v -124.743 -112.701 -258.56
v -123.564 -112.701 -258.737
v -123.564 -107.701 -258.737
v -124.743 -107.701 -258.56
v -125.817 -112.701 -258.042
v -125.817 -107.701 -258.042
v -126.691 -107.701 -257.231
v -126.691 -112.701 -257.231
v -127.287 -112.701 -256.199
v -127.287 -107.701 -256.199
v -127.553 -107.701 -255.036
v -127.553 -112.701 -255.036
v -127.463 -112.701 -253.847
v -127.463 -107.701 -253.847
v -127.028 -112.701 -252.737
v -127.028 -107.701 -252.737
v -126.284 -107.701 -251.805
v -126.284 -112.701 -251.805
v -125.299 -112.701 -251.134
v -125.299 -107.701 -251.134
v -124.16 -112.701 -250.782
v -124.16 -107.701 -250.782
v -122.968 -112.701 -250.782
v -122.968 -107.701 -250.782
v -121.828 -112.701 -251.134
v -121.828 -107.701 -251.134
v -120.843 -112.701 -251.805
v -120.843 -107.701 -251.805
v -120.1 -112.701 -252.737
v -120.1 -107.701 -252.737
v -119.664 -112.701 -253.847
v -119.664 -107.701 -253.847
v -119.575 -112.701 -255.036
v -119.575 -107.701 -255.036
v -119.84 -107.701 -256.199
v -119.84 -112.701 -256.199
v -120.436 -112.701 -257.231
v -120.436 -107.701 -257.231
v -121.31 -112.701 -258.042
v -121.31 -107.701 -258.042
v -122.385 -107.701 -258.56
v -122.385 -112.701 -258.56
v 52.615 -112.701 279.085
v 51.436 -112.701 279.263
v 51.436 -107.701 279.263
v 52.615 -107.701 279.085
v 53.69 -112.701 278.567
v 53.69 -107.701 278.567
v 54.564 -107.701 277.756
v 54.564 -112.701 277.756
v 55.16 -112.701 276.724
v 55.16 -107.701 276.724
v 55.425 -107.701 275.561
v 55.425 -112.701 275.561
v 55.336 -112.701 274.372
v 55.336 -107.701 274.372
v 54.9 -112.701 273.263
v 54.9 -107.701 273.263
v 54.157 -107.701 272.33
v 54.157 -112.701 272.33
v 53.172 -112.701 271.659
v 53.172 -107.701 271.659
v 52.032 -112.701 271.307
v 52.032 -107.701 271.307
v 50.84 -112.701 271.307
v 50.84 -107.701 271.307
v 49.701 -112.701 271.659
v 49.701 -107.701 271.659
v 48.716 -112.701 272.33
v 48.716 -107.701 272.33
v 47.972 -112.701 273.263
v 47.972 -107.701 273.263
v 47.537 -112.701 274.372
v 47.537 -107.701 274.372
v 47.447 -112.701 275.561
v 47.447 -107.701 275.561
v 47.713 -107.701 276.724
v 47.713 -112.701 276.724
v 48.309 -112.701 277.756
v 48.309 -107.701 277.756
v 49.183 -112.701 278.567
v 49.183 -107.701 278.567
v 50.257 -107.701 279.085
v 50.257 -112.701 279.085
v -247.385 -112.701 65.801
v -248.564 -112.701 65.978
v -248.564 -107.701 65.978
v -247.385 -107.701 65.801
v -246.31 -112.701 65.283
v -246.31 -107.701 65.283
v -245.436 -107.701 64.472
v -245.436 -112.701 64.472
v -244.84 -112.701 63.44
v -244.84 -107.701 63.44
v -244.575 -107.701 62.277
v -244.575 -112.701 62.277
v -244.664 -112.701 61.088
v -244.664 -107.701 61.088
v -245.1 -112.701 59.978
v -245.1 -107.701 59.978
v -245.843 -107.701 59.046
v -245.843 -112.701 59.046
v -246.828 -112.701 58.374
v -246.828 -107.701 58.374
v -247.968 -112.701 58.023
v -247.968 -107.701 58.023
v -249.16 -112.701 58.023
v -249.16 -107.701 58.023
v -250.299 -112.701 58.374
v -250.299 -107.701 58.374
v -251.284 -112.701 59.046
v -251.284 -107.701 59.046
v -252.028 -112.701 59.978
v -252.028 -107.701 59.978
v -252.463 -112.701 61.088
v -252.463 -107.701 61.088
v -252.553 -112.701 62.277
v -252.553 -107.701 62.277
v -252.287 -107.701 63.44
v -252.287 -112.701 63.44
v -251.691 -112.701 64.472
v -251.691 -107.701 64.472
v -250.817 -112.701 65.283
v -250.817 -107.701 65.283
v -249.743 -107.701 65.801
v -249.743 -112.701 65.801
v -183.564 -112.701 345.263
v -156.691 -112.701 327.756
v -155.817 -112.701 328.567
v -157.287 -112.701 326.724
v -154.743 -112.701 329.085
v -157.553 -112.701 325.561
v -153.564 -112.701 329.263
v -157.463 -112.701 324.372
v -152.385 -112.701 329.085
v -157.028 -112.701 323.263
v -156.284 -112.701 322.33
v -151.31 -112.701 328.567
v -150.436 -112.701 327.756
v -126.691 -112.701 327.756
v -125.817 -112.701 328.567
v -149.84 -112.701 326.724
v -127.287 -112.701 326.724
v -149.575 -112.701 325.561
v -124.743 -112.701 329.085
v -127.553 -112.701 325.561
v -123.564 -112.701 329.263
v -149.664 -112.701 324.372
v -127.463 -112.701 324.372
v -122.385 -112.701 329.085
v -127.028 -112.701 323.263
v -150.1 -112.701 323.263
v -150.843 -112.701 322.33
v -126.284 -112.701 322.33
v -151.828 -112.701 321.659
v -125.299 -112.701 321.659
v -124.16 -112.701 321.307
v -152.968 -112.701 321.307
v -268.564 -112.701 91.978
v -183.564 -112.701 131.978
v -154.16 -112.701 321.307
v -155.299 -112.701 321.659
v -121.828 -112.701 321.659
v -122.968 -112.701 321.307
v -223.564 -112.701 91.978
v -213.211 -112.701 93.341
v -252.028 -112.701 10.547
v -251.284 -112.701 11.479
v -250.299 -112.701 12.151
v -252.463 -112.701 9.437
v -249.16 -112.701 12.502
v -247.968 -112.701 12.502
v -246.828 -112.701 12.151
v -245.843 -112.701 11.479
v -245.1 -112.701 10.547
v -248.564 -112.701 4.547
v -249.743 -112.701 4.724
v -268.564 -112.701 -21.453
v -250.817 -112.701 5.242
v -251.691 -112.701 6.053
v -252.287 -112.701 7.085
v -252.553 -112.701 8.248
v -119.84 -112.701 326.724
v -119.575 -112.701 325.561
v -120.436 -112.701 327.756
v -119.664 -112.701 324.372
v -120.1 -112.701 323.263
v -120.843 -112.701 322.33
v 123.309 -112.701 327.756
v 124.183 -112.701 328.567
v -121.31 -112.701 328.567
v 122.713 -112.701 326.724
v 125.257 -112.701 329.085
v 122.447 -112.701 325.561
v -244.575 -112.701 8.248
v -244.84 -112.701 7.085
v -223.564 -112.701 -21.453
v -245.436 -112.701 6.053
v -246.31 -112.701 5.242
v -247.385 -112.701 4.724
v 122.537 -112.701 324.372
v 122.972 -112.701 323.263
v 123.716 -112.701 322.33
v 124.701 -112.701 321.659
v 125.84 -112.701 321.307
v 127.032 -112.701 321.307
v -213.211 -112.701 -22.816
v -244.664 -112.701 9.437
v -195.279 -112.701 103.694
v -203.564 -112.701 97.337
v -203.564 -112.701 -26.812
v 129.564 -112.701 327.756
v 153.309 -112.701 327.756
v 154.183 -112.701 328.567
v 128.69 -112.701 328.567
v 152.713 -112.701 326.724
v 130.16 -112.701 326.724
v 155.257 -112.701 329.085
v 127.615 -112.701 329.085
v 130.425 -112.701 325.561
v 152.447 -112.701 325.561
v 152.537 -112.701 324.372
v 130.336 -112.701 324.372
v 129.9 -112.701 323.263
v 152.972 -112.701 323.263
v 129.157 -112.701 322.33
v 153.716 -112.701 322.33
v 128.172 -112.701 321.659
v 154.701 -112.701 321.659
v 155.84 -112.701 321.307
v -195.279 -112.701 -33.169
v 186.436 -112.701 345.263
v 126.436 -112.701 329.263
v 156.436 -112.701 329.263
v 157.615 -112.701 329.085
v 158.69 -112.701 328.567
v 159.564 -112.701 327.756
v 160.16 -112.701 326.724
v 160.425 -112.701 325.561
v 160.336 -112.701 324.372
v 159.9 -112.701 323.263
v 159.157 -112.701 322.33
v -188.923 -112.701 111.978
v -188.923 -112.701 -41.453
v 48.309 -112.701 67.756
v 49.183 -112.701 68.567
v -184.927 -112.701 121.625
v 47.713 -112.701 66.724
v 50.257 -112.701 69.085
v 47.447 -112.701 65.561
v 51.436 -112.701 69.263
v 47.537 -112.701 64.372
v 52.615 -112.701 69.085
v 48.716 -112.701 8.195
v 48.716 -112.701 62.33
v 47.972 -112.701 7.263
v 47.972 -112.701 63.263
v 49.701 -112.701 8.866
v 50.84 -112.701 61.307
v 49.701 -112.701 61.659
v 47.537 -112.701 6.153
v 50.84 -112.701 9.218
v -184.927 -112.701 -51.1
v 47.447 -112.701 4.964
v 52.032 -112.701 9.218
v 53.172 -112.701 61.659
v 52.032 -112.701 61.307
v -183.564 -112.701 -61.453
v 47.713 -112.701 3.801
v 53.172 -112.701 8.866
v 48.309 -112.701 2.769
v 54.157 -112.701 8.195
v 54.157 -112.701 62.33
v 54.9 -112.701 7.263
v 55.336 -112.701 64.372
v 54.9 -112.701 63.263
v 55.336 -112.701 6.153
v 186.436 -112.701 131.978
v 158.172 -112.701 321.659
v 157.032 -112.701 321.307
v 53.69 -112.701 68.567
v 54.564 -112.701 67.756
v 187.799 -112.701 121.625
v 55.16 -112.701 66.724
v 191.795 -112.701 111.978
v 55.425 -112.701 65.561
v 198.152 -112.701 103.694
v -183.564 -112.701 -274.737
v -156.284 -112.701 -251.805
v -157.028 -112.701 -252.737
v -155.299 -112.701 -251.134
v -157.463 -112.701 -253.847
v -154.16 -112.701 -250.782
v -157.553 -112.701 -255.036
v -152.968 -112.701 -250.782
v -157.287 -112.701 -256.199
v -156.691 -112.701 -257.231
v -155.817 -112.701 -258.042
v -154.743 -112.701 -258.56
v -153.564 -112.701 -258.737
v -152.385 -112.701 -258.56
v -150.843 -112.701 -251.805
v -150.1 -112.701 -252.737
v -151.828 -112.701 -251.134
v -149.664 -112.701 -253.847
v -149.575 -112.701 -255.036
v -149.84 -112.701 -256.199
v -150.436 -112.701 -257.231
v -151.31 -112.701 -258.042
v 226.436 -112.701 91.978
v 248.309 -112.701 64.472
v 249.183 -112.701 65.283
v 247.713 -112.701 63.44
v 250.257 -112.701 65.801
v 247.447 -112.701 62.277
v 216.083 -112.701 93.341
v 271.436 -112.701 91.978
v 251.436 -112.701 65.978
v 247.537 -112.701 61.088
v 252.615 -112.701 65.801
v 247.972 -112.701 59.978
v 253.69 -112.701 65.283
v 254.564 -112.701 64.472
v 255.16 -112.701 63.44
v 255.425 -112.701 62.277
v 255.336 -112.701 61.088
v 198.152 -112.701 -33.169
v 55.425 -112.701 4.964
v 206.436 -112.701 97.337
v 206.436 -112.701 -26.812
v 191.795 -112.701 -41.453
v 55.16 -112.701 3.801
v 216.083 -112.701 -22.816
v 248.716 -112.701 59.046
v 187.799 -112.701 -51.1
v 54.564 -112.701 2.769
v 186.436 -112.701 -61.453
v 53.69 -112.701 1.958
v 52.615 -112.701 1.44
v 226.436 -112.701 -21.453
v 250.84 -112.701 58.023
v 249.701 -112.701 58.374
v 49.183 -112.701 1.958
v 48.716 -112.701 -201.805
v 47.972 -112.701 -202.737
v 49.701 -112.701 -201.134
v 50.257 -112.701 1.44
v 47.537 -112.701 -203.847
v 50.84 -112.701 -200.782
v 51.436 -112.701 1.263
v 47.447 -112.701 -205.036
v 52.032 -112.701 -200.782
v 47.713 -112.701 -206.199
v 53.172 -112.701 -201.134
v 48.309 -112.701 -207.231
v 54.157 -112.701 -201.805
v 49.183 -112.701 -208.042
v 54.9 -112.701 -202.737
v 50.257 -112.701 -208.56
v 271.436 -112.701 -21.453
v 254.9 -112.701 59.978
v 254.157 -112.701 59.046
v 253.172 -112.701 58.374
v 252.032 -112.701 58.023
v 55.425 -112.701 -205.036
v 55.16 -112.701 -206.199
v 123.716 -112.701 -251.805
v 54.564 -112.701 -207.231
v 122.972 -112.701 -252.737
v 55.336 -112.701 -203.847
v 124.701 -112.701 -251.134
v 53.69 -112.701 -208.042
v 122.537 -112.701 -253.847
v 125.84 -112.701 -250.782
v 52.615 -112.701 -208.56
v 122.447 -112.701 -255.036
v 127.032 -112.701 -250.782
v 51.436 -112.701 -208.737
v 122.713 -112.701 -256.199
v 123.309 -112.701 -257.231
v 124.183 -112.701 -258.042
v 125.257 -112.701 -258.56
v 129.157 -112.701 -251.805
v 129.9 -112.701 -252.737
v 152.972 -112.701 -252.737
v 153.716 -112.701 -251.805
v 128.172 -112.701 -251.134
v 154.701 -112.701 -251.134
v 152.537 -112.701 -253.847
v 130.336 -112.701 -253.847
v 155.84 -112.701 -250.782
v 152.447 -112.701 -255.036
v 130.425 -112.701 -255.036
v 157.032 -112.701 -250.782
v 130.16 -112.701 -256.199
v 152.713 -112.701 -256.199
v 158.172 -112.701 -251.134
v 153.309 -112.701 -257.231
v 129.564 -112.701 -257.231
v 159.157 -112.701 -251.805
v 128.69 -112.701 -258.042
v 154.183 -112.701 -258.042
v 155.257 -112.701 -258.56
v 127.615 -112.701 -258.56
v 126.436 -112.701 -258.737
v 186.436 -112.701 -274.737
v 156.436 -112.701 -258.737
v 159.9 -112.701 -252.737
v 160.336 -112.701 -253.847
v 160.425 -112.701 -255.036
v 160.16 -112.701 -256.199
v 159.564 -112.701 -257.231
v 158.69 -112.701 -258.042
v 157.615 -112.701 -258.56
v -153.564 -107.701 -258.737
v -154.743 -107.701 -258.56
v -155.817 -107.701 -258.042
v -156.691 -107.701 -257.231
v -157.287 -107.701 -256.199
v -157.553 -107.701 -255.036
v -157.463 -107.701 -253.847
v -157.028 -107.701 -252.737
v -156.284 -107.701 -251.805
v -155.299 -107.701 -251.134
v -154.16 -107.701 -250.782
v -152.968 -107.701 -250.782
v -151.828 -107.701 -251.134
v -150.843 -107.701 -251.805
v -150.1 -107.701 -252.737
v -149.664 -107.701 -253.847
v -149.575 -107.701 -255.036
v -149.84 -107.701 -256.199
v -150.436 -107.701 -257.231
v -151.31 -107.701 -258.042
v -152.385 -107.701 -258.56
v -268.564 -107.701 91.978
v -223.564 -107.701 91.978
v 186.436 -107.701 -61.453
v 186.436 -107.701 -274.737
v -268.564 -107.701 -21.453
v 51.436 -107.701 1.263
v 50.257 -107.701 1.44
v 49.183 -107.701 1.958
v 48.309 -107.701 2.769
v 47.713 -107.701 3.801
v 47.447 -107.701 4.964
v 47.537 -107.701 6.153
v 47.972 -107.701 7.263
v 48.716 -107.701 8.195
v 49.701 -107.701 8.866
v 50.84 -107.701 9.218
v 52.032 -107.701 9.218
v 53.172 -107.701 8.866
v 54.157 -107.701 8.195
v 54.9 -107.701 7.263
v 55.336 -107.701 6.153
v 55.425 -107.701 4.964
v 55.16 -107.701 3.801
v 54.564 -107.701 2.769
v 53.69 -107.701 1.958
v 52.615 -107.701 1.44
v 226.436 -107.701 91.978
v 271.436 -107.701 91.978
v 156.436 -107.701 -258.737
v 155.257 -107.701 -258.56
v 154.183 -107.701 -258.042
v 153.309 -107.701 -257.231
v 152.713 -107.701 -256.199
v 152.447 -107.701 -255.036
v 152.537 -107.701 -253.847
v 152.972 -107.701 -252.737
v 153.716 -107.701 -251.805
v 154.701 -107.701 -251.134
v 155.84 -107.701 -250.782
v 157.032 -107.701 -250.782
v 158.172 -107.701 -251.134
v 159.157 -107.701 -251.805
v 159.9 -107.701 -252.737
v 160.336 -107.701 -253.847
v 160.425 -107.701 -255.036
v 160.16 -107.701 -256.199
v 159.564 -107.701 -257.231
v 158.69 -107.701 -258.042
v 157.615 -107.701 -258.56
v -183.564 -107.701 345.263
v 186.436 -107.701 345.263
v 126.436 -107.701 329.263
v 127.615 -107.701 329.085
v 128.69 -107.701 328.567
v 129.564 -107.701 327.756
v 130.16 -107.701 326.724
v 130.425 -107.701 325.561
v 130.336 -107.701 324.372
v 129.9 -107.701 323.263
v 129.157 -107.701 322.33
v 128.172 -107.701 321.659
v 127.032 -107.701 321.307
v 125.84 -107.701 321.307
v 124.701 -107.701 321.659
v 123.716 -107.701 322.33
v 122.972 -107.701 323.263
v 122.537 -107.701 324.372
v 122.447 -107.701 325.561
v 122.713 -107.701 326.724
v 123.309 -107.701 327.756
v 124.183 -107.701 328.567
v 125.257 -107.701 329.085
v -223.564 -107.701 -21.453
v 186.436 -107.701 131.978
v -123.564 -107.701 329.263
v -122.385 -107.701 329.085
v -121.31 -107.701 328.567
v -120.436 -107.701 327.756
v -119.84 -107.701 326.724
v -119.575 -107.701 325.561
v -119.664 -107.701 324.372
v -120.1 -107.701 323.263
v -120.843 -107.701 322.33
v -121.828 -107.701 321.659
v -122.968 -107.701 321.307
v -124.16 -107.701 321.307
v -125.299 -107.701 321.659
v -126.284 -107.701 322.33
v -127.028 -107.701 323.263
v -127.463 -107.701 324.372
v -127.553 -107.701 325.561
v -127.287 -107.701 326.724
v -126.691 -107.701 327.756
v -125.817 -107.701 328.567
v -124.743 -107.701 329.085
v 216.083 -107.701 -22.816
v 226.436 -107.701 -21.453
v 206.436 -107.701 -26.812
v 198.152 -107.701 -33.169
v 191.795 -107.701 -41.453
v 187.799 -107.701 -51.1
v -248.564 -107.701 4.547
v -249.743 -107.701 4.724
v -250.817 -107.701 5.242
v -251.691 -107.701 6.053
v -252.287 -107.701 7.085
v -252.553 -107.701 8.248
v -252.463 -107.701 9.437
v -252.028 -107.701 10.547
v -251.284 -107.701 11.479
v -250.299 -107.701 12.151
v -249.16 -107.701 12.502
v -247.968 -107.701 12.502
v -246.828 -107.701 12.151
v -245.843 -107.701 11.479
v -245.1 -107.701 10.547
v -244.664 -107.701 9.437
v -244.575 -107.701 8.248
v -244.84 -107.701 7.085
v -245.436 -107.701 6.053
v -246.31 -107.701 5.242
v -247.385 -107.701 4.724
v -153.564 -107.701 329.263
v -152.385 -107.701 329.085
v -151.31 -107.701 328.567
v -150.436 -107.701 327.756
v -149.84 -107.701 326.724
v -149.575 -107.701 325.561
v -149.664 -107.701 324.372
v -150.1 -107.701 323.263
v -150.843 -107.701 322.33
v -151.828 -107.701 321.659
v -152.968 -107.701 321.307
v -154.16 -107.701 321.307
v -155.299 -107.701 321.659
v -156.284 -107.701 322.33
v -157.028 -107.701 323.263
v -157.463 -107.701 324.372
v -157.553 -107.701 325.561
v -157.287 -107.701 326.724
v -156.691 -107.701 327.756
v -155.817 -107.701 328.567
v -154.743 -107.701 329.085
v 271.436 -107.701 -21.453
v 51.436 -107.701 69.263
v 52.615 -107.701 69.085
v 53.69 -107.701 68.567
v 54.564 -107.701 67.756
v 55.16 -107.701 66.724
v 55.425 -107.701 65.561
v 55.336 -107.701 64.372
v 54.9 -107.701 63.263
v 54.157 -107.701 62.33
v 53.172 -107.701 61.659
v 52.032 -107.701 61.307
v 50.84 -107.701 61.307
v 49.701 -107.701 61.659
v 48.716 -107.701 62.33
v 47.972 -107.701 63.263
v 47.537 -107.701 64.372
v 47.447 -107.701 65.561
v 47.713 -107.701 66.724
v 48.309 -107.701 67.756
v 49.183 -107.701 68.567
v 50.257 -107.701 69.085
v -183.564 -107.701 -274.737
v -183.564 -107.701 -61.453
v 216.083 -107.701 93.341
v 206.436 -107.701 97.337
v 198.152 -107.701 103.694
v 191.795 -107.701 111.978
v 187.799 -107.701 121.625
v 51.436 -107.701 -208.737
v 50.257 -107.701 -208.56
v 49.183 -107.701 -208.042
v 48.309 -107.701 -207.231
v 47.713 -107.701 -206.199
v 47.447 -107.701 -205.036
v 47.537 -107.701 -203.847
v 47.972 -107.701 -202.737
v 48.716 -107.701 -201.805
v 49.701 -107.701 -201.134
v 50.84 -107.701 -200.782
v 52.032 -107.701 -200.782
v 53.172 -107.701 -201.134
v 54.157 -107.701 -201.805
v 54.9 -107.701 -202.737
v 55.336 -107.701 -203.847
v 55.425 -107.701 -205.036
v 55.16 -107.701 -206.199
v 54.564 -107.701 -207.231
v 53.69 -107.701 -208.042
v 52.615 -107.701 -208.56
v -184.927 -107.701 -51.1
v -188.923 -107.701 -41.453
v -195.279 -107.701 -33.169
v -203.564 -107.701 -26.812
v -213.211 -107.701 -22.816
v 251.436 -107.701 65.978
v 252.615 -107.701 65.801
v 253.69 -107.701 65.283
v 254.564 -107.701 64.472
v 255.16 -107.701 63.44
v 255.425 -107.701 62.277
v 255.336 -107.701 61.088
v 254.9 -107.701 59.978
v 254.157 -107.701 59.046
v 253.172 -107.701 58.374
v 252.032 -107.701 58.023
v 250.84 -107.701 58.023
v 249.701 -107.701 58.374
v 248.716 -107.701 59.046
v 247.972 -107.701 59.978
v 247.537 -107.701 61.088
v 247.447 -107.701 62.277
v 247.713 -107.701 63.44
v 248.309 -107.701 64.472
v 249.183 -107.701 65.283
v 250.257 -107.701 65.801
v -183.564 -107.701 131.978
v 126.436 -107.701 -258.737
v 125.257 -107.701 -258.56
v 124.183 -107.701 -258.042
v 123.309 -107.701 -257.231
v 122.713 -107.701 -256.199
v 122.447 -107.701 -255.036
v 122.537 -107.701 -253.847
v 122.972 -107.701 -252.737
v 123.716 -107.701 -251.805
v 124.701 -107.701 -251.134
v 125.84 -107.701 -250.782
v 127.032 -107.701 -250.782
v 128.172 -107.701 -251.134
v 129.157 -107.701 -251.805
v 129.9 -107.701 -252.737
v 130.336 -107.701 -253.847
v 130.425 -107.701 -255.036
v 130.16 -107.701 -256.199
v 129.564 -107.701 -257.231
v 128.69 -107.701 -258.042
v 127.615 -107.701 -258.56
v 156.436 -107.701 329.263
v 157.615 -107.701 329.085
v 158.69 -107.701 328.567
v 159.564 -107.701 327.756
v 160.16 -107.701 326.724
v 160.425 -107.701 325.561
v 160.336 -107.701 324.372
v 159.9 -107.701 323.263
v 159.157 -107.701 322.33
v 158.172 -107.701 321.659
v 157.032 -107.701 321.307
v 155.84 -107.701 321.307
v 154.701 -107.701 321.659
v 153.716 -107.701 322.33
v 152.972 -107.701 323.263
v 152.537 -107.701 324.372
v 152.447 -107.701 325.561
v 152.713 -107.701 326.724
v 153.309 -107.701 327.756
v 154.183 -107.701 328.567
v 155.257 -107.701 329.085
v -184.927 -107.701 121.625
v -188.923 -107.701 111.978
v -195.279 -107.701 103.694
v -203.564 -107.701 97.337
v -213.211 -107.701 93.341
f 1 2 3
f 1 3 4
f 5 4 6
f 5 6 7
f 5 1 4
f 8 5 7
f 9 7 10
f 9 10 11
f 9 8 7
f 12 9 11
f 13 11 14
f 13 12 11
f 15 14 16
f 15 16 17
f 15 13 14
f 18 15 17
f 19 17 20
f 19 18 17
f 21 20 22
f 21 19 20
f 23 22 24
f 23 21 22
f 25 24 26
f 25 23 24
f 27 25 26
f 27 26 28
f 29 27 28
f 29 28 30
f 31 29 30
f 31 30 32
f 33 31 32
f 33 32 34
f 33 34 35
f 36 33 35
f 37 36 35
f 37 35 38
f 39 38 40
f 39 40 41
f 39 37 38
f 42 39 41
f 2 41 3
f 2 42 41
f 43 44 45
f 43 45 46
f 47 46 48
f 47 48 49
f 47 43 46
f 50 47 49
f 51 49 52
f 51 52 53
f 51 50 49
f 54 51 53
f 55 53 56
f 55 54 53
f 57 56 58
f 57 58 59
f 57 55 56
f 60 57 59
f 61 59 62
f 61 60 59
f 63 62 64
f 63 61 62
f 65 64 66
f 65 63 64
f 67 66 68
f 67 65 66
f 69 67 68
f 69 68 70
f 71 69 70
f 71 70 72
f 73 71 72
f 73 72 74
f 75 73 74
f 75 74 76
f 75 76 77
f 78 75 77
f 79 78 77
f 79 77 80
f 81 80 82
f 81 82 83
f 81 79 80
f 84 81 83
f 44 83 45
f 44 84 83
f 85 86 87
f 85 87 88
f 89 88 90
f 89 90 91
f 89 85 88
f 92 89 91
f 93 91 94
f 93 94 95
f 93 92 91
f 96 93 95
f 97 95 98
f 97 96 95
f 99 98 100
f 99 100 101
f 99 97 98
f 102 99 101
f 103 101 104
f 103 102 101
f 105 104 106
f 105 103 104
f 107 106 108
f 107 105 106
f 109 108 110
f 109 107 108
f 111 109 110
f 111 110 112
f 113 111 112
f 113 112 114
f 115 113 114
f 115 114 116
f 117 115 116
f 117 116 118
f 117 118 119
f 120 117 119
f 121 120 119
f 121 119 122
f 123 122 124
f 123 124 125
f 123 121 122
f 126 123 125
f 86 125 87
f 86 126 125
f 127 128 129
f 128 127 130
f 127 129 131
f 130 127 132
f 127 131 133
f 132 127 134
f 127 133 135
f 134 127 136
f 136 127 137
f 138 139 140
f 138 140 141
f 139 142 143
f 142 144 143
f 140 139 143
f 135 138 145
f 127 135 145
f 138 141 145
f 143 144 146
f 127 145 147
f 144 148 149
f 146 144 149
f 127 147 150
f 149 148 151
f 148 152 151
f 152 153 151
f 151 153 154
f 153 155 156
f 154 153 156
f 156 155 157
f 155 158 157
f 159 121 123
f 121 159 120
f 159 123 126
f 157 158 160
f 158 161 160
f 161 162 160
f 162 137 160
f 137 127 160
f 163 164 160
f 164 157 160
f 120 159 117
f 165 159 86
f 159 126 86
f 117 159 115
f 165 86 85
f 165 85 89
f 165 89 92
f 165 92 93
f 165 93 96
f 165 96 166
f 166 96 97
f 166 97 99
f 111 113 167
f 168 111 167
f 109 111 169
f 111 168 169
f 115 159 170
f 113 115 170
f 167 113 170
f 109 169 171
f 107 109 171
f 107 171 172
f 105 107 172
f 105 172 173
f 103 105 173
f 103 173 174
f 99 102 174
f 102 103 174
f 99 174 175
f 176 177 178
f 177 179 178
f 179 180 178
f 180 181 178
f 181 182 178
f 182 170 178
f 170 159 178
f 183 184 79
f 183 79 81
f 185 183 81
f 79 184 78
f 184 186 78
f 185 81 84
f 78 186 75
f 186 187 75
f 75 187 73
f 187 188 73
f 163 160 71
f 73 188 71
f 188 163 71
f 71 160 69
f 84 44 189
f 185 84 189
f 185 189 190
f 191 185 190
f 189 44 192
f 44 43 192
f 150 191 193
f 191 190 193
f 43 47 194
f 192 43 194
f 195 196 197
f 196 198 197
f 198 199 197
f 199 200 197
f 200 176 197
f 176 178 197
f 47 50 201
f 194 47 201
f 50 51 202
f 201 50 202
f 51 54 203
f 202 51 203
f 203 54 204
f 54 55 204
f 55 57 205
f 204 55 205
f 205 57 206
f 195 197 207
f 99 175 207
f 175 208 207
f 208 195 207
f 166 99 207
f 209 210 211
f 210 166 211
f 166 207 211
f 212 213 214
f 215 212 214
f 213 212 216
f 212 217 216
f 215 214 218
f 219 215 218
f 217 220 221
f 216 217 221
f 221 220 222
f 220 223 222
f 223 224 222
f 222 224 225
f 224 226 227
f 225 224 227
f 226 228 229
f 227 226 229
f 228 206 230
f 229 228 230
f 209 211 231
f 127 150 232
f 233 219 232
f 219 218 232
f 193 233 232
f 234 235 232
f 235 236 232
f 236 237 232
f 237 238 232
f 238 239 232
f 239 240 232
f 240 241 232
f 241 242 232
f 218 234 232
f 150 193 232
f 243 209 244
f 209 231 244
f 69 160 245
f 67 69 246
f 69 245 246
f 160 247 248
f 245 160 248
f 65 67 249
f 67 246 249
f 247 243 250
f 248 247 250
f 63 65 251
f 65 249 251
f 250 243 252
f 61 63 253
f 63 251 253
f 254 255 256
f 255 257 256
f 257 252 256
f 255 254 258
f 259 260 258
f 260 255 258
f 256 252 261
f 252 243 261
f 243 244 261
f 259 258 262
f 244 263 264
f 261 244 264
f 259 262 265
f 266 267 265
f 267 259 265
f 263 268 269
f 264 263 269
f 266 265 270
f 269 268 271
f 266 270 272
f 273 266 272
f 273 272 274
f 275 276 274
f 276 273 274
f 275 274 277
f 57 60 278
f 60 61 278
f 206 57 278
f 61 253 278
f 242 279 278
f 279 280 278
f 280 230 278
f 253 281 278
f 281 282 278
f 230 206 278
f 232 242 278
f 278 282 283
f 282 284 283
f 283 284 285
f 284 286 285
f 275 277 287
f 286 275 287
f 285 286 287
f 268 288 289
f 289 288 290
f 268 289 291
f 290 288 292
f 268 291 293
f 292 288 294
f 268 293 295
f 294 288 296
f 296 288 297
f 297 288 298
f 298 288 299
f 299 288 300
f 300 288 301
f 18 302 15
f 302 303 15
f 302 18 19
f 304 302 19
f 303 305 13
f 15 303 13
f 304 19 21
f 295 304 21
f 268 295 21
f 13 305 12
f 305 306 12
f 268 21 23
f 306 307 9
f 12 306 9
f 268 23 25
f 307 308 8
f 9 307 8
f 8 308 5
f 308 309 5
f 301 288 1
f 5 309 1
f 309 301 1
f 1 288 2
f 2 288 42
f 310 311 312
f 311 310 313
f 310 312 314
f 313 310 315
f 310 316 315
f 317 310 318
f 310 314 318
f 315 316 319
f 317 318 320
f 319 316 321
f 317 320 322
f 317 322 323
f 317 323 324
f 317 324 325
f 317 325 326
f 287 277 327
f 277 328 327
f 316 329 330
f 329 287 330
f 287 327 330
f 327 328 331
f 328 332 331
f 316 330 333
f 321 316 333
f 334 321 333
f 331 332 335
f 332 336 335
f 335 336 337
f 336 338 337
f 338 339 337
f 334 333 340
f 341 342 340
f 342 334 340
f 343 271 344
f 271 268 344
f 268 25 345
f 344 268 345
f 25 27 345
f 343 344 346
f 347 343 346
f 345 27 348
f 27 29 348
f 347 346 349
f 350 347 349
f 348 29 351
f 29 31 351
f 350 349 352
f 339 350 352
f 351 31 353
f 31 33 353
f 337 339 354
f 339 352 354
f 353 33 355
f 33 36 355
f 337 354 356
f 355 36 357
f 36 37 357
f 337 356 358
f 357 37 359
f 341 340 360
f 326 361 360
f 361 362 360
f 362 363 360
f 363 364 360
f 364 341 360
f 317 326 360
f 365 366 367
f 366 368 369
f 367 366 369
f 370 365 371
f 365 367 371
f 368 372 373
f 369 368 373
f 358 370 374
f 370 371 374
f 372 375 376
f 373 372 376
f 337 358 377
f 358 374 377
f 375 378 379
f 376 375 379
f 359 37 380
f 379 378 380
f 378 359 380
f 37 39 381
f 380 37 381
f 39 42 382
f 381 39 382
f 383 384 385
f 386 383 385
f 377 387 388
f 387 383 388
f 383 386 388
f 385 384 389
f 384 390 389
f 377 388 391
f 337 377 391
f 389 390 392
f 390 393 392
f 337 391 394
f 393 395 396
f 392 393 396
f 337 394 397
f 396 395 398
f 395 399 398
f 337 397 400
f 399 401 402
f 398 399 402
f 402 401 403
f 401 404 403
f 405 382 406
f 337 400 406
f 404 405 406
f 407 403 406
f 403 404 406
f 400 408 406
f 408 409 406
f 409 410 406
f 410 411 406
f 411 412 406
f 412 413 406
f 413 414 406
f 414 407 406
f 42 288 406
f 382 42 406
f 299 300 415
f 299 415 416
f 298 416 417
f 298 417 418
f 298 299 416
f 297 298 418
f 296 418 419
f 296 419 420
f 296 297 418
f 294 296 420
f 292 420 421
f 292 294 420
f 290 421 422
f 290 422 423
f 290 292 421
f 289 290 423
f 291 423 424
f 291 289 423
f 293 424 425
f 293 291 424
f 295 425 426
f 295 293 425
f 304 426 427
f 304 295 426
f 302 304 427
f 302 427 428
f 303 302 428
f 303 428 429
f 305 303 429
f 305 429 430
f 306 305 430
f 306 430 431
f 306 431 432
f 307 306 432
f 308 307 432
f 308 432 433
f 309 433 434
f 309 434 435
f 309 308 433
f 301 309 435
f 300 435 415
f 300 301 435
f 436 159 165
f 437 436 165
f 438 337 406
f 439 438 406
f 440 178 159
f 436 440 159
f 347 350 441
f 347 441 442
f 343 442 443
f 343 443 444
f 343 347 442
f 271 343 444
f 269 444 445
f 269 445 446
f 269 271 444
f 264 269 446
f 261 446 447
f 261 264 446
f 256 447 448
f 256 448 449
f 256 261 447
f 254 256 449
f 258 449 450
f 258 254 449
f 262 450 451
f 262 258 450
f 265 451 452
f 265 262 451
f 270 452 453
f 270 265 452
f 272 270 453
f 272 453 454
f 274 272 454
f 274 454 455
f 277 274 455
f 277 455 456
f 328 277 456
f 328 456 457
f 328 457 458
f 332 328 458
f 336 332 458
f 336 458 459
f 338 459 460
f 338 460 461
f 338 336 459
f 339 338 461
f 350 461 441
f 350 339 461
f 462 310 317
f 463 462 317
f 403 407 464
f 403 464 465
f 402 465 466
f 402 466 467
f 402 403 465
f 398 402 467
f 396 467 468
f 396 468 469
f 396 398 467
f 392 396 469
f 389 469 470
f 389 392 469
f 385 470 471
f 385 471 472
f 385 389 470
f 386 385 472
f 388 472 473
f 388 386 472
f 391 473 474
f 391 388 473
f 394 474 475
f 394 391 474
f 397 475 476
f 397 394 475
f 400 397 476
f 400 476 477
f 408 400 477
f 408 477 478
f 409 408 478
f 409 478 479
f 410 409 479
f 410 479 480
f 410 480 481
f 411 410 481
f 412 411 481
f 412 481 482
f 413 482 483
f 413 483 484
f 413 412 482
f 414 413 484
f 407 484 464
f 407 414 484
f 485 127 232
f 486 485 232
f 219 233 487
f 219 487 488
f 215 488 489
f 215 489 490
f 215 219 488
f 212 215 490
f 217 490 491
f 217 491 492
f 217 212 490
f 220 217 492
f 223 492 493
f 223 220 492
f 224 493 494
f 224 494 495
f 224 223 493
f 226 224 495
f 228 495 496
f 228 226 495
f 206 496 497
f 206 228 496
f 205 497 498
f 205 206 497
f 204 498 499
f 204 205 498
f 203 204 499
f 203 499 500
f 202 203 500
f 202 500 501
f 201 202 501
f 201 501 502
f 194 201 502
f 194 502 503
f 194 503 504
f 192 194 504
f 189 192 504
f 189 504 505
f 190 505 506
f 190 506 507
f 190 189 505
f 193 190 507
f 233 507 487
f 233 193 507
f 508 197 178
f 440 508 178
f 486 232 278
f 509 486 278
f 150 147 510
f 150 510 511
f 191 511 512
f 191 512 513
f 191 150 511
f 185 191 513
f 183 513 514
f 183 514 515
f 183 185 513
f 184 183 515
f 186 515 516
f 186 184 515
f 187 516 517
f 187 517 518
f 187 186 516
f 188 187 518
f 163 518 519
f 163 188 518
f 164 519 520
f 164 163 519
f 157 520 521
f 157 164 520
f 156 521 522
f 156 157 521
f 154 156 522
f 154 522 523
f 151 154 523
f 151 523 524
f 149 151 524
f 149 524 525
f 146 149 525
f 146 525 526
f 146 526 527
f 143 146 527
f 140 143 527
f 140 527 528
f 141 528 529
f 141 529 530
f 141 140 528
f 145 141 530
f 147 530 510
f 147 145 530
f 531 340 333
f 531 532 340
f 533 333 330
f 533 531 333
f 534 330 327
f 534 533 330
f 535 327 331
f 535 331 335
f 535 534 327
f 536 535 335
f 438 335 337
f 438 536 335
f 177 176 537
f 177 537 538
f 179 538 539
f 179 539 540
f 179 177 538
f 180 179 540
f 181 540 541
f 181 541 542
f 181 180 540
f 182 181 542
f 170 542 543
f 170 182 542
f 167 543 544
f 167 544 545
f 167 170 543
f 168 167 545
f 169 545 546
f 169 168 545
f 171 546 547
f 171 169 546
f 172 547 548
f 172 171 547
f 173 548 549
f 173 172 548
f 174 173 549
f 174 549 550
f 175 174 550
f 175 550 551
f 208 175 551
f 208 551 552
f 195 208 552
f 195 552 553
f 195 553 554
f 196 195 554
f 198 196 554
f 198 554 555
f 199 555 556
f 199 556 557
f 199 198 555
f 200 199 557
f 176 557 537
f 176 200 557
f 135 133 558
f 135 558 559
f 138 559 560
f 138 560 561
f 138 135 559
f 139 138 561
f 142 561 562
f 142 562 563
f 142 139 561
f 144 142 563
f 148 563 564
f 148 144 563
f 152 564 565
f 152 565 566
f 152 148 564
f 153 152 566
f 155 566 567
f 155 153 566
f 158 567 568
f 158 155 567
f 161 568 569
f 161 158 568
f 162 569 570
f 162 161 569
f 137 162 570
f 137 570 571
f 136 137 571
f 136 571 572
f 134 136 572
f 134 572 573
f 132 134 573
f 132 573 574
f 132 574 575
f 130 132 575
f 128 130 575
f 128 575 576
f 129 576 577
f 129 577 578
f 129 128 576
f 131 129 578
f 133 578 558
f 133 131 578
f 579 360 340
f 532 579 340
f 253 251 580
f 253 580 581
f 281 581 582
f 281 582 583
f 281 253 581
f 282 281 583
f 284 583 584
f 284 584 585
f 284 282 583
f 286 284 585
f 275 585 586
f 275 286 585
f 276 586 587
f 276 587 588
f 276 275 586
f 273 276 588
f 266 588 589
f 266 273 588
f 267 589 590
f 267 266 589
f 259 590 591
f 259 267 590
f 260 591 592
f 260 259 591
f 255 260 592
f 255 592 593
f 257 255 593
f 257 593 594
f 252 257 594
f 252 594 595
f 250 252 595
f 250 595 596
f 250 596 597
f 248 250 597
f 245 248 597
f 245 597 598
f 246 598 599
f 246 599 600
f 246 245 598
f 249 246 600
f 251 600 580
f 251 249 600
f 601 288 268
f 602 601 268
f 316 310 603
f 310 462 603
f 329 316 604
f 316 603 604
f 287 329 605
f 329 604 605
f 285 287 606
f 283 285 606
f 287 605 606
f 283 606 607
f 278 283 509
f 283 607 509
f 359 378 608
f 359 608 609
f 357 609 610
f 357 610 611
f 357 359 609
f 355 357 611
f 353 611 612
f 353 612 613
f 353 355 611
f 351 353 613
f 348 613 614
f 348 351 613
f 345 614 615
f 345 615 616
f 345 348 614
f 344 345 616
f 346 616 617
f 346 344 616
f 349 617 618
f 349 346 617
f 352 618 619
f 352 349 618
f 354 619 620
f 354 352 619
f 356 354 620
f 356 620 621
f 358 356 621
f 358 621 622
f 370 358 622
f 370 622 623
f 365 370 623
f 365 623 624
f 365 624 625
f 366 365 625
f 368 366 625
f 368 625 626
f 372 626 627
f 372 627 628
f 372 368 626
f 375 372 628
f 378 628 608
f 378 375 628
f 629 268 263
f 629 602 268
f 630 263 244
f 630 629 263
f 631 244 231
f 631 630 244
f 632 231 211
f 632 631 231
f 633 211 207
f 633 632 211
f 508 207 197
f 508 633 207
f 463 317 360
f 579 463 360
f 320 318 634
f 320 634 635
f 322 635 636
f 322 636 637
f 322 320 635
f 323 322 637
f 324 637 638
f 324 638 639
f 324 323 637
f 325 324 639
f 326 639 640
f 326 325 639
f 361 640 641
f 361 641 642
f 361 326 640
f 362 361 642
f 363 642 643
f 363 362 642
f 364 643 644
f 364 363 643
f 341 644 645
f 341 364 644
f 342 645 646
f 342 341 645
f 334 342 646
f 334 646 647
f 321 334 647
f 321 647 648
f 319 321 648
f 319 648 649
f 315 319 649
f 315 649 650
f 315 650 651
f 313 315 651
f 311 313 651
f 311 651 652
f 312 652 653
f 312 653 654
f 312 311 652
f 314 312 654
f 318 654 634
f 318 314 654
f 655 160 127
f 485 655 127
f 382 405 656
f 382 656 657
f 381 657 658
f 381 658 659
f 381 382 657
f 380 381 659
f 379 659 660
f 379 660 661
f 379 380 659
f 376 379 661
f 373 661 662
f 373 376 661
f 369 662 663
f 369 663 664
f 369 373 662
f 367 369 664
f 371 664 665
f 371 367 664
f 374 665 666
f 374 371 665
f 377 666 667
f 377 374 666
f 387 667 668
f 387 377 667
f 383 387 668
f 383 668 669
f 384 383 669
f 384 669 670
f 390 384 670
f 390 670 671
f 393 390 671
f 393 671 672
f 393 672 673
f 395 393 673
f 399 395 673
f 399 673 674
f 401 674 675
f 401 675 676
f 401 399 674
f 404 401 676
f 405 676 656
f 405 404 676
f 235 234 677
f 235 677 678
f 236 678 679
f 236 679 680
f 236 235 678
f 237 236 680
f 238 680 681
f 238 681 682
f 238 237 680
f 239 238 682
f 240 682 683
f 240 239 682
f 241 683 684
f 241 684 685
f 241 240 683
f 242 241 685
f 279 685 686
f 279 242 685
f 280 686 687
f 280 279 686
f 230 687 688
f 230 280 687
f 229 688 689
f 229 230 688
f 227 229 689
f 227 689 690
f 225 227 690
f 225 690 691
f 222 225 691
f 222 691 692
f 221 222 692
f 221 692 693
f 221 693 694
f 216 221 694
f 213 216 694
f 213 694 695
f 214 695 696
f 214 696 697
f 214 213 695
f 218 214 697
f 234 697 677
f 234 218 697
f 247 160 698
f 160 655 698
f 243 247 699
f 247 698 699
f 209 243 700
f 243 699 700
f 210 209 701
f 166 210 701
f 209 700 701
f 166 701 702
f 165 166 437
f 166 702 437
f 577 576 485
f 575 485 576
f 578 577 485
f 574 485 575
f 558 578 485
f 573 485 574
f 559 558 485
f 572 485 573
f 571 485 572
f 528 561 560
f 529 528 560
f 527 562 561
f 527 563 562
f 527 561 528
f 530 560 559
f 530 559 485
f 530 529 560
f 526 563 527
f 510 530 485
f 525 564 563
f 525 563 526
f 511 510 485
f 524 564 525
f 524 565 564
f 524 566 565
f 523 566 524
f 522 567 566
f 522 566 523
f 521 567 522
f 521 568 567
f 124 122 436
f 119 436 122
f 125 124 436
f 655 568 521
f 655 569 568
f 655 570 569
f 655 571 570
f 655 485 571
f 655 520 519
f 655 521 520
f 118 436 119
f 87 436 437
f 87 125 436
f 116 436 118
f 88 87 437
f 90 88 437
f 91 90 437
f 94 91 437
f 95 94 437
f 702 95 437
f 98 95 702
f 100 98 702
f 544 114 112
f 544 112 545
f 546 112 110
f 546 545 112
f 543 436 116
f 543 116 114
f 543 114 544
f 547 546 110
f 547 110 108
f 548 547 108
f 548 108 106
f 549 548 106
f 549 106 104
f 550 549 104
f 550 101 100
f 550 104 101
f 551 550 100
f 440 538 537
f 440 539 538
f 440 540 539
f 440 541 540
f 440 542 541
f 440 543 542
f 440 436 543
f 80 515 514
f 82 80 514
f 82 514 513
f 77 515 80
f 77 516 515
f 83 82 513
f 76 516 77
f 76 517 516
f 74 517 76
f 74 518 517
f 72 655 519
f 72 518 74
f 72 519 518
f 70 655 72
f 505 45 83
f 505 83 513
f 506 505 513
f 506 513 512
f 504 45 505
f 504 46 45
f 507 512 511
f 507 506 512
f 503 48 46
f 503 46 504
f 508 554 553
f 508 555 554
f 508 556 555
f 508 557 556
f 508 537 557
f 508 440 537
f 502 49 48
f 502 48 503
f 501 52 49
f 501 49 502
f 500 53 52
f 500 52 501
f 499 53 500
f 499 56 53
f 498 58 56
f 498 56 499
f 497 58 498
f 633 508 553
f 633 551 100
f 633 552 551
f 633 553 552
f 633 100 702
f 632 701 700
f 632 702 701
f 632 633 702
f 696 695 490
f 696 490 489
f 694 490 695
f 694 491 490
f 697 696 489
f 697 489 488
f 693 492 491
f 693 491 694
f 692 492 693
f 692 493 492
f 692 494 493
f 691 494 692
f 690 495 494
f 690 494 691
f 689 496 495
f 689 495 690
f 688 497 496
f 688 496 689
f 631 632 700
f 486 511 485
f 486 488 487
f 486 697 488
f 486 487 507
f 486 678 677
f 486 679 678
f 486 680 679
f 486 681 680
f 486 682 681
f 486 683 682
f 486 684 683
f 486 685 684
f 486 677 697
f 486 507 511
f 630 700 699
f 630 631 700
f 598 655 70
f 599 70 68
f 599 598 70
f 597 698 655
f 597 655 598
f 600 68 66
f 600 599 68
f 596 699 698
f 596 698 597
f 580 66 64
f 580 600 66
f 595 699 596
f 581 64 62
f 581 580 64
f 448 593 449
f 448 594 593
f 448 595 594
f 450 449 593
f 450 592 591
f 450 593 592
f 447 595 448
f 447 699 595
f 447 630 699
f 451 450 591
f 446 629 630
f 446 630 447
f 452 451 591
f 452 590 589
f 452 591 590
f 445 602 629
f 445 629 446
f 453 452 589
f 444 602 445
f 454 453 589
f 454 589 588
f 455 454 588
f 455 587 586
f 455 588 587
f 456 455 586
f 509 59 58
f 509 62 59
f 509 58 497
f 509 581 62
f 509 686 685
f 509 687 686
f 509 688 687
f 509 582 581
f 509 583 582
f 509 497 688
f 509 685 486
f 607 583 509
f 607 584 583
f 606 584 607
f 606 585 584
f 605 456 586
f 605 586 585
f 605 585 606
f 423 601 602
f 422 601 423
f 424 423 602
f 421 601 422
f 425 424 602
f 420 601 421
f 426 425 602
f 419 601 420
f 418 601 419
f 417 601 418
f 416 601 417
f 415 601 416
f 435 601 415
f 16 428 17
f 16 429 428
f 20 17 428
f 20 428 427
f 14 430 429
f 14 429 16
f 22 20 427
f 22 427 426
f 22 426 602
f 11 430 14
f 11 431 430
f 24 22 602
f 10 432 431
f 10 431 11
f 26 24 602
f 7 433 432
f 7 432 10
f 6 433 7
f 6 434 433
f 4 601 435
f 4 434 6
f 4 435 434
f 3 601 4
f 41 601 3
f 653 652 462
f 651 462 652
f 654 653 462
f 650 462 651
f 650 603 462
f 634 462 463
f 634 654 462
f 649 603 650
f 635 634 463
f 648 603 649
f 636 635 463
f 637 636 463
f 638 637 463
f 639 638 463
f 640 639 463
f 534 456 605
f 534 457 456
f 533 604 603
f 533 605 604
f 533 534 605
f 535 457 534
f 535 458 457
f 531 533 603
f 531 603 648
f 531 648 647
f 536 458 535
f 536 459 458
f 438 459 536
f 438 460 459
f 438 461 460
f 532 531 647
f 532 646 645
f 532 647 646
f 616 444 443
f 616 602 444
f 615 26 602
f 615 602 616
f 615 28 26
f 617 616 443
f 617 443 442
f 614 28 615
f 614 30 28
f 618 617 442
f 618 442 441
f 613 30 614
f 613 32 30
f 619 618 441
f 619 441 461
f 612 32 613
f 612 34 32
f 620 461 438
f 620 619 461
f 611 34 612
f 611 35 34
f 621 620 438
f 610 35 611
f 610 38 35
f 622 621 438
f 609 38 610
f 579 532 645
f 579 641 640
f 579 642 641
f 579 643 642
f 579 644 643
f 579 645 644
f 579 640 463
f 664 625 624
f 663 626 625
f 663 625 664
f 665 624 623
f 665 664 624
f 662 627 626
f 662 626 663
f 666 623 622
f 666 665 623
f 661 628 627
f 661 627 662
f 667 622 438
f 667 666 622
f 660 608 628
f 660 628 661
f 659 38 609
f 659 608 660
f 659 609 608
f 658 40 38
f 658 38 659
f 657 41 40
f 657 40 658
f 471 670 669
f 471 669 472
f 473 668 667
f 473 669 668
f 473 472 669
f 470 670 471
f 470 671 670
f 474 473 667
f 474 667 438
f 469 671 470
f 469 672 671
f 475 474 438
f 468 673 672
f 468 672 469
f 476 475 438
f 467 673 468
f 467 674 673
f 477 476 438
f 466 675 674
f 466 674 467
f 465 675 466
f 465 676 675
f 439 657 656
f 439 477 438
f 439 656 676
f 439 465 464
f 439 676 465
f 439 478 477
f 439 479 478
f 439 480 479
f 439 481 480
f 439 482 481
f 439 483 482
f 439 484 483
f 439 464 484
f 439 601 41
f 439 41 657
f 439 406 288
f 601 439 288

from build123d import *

# Parameters (mm, degrees)
SKETCH2_R           = 4
BOSS_EXTRUDE1_DEPTH = 5
FILLET1_R           = 40


with BuildPart() as part:
    # Sketch2 → Boss-Extrude1 (new body)
    with BuildSketch(Plane(origin=(0, -112.700994014, 0), x_dir=(1, 0, 0), z_dir=(0, 1, 0))):
        Polygon((271.436244825, 21.453222376), (186.436244825, 21.453222376), (186.436244825, 274.737493623), (-183.563755175, 274.737493623), (-183.563755175, 21.453222376), (-268.563755175, 21.453222376), (-268.563755175, -91.978235129), (-183.563755175, -91.978235129), (-183.563755175, -345.262506377), (186.436244825, -345.262506377), (186.436244825, -91.978235129), (271.436244825, -91.978235129), align=None)
        with Locations(Location((156.436244825, -325.262506377, 0), (0, 0, 270))):
            Circle(SKETCH2_R, mode=Mode.SUBTRACT)
        with Locations(Location((126.436244825, -325.262506377, 0), (0, 0, 270))):
            Circle(SKETCH2_R, mode=Mode.SUBTRACT)
        with Locations(Location((251.436244825, -61.978235129, 0), (0, 0, 270))):
            Circle(SKETCH2_R, mode=Mode.SUBTRACT)
        with Locations(Location((-153.563755175, -325.262506377, 0), (0, 0, 270))):
            Circle(SKETCH2_R, mode=Mode.SUBTRACT)
        with Locations(Location((-123.563755175, -325.262506377, 0), (0, 0, 270))):
            Circle(SKETCH2_R, mode=Mode.SUBTRACT)
        with Locations(Location((-248.563755175, -61.978235129, 0), (0, 0, 270))):
            Circle(SKETCH2_R, mode=Mode.SUBTRACT)
        with Locations(Location((51.436244825, -275.262506377, 0), (0, 0, 270))):
            Circle(SKETCH2_R, mode=Mode.SUBTRACT)
        with Locations(Location((51.436244825, -65.262506377, 0), (0, 0, 270))):
            Circle(SKETCH2_R, mode=Mode.SUBTRACT)
        with Locations(Location((51.436244825, -5.262506377, 0), (0, 0, 90))):
            Circle(SKETCH2_R, mode=Mode.SUBTRACT)
        with Locations(Location((51.436244825, 204.737493623, 0), (0, 0, 90))):
            Circle(SKETCH2_R, mode=Mode.SUBTRACT)
        with Locations(Location((-248.563755175, -8.546777624, 0), (0, 0, 90))):
            Circle(SKETCH2_R, mode=Mode.SUBTRACT)
        with Locations(Location((-123.563755175, 254.737493623, 0), (0, 0, 90))):
            Circle(SKETCH2_R, mode=Mode.SUBTRACT)
        with Locations(Location((-153.563755175, 254.737493623, 0), (0, 0, 90))):
            Circle(SKETCH2_R, mode=Mode.SUBTRACT)
        with Locations(Location((126.436244825, 254.737493623, 0), (0, 0, 90))):
            Circle(SKETCH2_R, mode=Mode.SUBTRACT)
        with Locations(Location((156.436244825, 254.737493623, 0), (0, 0, 90))):
            Circle(SKETCH2_R, mode=Mode.SUBTRACT)
    extrude(amount=BOSS_EXTRUDE1_DEPTH)

    # Fillet1
    fillet1_edges = [part.edges().sort_by_distance(p)[0] for p in [
        (186.436244825, -110.200994014, -21.453222376),
        (186.436244825, -110.200994014, 91.978235129),
        (-183.563755175, -110.200994014, 91.978235129),
        (-183.563755175, -110.200994014, -21.453222376),
    ]]
    fillet(fillet1_edges, radius=FILLET1_R)


solid = part.part
